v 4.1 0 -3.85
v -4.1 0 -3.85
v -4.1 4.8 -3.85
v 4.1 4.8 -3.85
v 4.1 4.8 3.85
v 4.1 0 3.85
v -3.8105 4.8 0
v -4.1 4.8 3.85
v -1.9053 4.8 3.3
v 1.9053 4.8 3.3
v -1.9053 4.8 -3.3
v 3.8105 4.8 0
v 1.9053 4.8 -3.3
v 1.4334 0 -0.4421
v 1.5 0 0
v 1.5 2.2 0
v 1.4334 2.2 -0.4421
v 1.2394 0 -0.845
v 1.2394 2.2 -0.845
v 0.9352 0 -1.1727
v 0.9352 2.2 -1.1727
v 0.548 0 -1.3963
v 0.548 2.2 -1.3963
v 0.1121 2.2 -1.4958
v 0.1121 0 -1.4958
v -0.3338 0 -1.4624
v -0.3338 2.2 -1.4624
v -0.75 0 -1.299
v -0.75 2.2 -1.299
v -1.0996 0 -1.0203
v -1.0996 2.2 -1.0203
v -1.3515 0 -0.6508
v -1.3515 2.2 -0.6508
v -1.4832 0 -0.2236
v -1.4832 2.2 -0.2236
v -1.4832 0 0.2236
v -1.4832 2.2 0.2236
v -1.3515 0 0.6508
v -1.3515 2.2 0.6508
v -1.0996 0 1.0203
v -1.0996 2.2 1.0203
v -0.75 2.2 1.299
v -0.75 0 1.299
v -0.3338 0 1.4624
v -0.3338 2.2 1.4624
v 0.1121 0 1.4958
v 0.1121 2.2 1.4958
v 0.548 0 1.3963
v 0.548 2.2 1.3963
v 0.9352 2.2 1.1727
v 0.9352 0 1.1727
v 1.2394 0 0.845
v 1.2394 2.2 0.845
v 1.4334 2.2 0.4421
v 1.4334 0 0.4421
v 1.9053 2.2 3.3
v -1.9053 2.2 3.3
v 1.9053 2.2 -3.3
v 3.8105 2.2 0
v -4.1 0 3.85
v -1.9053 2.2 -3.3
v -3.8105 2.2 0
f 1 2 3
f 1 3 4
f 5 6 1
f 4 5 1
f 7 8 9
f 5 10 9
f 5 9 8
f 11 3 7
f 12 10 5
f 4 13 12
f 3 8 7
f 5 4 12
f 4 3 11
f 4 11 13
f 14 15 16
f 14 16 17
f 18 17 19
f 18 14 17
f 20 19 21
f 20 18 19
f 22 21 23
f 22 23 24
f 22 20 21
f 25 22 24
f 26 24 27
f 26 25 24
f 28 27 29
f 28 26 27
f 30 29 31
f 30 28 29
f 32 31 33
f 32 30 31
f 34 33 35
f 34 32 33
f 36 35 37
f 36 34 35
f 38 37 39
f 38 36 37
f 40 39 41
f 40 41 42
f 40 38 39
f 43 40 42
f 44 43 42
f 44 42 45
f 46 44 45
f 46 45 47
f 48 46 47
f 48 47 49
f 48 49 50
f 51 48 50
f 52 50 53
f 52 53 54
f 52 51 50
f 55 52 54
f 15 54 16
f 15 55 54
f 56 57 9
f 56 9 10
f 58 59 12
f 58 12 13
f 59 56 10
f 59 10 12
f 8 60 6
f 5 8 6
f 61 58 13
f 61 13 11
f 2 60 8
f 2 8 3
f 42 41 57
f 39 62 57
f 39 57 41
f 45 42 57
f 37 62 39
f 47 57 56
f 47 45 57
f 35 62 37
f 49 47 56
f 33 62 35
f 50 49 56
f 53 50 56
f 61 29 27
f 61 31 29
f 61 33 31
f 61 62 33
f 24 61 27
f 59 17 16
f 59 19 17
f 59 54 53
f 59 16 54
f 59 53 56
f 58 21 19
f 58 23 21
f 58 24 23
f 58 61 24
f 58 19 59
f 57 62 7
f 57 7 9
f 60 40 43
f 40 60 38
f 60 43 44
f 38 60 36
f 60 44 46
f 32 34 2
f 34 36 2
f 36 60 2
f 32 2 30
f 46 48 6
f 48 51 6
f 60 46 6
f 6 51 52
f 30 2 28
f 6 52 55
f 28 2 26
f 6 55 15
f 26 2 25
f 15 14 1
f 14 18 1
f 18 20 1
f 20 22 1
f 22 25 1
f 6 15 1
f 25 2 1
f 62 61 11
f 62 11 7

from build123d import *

# Parameters (mm, degrees)
ESQUISSE1_W        = 8.2
ESQUISSE1_H        = 7.7
BOSS_EXTRU_1_DEPTH = 4.8
ESQUISSE1_3_R      = 1.5
BOSS_EXTRU_2_DEPTH = 2.2


with BuildPart() as part:
    # Esquisse1 → Boss.-Extru.1 (new body)
    with BuildSketch(Plane(origin=(0, 0, 0), x_dir=(1, 0, 0), z_dir=(0, 1, 0))):
        Rectangle(ESQUISSE1_W, ESQUISSE1_H)
        Polygon((1.905255888, 3.3), (3.810511777, 0), (1.905255888, -3.3), (-1.905255888, -3.3), (-3.810511777, 0), (-1.905255888, 3.3), align=None, mode=Mode.SUBTRACT)
    extrude(amount=BOSS_EXTRU_1_DEPTH)

    # Esquisse1<3> → Boss.-Extru.2 (add)
    with BuildSketch(Plane(origin=(0, 0, 0), x_dir=(1, 0, 0), z_dir=(0, 1, 0))):
        Polygon((1.905255888, -3.3), (3.810511777, 0), (1.905255888, 3.3), (-1.905255888, 3.3), (-3.810511777, 0), (-1.905255888, -3.3), align=None)
        Circle(ESQUISSE1_3_R, mode=Mode.SUBTRACT)
    extrude(amount=BOSS_EXTRU_2_DEPTH)


solid = part.part
